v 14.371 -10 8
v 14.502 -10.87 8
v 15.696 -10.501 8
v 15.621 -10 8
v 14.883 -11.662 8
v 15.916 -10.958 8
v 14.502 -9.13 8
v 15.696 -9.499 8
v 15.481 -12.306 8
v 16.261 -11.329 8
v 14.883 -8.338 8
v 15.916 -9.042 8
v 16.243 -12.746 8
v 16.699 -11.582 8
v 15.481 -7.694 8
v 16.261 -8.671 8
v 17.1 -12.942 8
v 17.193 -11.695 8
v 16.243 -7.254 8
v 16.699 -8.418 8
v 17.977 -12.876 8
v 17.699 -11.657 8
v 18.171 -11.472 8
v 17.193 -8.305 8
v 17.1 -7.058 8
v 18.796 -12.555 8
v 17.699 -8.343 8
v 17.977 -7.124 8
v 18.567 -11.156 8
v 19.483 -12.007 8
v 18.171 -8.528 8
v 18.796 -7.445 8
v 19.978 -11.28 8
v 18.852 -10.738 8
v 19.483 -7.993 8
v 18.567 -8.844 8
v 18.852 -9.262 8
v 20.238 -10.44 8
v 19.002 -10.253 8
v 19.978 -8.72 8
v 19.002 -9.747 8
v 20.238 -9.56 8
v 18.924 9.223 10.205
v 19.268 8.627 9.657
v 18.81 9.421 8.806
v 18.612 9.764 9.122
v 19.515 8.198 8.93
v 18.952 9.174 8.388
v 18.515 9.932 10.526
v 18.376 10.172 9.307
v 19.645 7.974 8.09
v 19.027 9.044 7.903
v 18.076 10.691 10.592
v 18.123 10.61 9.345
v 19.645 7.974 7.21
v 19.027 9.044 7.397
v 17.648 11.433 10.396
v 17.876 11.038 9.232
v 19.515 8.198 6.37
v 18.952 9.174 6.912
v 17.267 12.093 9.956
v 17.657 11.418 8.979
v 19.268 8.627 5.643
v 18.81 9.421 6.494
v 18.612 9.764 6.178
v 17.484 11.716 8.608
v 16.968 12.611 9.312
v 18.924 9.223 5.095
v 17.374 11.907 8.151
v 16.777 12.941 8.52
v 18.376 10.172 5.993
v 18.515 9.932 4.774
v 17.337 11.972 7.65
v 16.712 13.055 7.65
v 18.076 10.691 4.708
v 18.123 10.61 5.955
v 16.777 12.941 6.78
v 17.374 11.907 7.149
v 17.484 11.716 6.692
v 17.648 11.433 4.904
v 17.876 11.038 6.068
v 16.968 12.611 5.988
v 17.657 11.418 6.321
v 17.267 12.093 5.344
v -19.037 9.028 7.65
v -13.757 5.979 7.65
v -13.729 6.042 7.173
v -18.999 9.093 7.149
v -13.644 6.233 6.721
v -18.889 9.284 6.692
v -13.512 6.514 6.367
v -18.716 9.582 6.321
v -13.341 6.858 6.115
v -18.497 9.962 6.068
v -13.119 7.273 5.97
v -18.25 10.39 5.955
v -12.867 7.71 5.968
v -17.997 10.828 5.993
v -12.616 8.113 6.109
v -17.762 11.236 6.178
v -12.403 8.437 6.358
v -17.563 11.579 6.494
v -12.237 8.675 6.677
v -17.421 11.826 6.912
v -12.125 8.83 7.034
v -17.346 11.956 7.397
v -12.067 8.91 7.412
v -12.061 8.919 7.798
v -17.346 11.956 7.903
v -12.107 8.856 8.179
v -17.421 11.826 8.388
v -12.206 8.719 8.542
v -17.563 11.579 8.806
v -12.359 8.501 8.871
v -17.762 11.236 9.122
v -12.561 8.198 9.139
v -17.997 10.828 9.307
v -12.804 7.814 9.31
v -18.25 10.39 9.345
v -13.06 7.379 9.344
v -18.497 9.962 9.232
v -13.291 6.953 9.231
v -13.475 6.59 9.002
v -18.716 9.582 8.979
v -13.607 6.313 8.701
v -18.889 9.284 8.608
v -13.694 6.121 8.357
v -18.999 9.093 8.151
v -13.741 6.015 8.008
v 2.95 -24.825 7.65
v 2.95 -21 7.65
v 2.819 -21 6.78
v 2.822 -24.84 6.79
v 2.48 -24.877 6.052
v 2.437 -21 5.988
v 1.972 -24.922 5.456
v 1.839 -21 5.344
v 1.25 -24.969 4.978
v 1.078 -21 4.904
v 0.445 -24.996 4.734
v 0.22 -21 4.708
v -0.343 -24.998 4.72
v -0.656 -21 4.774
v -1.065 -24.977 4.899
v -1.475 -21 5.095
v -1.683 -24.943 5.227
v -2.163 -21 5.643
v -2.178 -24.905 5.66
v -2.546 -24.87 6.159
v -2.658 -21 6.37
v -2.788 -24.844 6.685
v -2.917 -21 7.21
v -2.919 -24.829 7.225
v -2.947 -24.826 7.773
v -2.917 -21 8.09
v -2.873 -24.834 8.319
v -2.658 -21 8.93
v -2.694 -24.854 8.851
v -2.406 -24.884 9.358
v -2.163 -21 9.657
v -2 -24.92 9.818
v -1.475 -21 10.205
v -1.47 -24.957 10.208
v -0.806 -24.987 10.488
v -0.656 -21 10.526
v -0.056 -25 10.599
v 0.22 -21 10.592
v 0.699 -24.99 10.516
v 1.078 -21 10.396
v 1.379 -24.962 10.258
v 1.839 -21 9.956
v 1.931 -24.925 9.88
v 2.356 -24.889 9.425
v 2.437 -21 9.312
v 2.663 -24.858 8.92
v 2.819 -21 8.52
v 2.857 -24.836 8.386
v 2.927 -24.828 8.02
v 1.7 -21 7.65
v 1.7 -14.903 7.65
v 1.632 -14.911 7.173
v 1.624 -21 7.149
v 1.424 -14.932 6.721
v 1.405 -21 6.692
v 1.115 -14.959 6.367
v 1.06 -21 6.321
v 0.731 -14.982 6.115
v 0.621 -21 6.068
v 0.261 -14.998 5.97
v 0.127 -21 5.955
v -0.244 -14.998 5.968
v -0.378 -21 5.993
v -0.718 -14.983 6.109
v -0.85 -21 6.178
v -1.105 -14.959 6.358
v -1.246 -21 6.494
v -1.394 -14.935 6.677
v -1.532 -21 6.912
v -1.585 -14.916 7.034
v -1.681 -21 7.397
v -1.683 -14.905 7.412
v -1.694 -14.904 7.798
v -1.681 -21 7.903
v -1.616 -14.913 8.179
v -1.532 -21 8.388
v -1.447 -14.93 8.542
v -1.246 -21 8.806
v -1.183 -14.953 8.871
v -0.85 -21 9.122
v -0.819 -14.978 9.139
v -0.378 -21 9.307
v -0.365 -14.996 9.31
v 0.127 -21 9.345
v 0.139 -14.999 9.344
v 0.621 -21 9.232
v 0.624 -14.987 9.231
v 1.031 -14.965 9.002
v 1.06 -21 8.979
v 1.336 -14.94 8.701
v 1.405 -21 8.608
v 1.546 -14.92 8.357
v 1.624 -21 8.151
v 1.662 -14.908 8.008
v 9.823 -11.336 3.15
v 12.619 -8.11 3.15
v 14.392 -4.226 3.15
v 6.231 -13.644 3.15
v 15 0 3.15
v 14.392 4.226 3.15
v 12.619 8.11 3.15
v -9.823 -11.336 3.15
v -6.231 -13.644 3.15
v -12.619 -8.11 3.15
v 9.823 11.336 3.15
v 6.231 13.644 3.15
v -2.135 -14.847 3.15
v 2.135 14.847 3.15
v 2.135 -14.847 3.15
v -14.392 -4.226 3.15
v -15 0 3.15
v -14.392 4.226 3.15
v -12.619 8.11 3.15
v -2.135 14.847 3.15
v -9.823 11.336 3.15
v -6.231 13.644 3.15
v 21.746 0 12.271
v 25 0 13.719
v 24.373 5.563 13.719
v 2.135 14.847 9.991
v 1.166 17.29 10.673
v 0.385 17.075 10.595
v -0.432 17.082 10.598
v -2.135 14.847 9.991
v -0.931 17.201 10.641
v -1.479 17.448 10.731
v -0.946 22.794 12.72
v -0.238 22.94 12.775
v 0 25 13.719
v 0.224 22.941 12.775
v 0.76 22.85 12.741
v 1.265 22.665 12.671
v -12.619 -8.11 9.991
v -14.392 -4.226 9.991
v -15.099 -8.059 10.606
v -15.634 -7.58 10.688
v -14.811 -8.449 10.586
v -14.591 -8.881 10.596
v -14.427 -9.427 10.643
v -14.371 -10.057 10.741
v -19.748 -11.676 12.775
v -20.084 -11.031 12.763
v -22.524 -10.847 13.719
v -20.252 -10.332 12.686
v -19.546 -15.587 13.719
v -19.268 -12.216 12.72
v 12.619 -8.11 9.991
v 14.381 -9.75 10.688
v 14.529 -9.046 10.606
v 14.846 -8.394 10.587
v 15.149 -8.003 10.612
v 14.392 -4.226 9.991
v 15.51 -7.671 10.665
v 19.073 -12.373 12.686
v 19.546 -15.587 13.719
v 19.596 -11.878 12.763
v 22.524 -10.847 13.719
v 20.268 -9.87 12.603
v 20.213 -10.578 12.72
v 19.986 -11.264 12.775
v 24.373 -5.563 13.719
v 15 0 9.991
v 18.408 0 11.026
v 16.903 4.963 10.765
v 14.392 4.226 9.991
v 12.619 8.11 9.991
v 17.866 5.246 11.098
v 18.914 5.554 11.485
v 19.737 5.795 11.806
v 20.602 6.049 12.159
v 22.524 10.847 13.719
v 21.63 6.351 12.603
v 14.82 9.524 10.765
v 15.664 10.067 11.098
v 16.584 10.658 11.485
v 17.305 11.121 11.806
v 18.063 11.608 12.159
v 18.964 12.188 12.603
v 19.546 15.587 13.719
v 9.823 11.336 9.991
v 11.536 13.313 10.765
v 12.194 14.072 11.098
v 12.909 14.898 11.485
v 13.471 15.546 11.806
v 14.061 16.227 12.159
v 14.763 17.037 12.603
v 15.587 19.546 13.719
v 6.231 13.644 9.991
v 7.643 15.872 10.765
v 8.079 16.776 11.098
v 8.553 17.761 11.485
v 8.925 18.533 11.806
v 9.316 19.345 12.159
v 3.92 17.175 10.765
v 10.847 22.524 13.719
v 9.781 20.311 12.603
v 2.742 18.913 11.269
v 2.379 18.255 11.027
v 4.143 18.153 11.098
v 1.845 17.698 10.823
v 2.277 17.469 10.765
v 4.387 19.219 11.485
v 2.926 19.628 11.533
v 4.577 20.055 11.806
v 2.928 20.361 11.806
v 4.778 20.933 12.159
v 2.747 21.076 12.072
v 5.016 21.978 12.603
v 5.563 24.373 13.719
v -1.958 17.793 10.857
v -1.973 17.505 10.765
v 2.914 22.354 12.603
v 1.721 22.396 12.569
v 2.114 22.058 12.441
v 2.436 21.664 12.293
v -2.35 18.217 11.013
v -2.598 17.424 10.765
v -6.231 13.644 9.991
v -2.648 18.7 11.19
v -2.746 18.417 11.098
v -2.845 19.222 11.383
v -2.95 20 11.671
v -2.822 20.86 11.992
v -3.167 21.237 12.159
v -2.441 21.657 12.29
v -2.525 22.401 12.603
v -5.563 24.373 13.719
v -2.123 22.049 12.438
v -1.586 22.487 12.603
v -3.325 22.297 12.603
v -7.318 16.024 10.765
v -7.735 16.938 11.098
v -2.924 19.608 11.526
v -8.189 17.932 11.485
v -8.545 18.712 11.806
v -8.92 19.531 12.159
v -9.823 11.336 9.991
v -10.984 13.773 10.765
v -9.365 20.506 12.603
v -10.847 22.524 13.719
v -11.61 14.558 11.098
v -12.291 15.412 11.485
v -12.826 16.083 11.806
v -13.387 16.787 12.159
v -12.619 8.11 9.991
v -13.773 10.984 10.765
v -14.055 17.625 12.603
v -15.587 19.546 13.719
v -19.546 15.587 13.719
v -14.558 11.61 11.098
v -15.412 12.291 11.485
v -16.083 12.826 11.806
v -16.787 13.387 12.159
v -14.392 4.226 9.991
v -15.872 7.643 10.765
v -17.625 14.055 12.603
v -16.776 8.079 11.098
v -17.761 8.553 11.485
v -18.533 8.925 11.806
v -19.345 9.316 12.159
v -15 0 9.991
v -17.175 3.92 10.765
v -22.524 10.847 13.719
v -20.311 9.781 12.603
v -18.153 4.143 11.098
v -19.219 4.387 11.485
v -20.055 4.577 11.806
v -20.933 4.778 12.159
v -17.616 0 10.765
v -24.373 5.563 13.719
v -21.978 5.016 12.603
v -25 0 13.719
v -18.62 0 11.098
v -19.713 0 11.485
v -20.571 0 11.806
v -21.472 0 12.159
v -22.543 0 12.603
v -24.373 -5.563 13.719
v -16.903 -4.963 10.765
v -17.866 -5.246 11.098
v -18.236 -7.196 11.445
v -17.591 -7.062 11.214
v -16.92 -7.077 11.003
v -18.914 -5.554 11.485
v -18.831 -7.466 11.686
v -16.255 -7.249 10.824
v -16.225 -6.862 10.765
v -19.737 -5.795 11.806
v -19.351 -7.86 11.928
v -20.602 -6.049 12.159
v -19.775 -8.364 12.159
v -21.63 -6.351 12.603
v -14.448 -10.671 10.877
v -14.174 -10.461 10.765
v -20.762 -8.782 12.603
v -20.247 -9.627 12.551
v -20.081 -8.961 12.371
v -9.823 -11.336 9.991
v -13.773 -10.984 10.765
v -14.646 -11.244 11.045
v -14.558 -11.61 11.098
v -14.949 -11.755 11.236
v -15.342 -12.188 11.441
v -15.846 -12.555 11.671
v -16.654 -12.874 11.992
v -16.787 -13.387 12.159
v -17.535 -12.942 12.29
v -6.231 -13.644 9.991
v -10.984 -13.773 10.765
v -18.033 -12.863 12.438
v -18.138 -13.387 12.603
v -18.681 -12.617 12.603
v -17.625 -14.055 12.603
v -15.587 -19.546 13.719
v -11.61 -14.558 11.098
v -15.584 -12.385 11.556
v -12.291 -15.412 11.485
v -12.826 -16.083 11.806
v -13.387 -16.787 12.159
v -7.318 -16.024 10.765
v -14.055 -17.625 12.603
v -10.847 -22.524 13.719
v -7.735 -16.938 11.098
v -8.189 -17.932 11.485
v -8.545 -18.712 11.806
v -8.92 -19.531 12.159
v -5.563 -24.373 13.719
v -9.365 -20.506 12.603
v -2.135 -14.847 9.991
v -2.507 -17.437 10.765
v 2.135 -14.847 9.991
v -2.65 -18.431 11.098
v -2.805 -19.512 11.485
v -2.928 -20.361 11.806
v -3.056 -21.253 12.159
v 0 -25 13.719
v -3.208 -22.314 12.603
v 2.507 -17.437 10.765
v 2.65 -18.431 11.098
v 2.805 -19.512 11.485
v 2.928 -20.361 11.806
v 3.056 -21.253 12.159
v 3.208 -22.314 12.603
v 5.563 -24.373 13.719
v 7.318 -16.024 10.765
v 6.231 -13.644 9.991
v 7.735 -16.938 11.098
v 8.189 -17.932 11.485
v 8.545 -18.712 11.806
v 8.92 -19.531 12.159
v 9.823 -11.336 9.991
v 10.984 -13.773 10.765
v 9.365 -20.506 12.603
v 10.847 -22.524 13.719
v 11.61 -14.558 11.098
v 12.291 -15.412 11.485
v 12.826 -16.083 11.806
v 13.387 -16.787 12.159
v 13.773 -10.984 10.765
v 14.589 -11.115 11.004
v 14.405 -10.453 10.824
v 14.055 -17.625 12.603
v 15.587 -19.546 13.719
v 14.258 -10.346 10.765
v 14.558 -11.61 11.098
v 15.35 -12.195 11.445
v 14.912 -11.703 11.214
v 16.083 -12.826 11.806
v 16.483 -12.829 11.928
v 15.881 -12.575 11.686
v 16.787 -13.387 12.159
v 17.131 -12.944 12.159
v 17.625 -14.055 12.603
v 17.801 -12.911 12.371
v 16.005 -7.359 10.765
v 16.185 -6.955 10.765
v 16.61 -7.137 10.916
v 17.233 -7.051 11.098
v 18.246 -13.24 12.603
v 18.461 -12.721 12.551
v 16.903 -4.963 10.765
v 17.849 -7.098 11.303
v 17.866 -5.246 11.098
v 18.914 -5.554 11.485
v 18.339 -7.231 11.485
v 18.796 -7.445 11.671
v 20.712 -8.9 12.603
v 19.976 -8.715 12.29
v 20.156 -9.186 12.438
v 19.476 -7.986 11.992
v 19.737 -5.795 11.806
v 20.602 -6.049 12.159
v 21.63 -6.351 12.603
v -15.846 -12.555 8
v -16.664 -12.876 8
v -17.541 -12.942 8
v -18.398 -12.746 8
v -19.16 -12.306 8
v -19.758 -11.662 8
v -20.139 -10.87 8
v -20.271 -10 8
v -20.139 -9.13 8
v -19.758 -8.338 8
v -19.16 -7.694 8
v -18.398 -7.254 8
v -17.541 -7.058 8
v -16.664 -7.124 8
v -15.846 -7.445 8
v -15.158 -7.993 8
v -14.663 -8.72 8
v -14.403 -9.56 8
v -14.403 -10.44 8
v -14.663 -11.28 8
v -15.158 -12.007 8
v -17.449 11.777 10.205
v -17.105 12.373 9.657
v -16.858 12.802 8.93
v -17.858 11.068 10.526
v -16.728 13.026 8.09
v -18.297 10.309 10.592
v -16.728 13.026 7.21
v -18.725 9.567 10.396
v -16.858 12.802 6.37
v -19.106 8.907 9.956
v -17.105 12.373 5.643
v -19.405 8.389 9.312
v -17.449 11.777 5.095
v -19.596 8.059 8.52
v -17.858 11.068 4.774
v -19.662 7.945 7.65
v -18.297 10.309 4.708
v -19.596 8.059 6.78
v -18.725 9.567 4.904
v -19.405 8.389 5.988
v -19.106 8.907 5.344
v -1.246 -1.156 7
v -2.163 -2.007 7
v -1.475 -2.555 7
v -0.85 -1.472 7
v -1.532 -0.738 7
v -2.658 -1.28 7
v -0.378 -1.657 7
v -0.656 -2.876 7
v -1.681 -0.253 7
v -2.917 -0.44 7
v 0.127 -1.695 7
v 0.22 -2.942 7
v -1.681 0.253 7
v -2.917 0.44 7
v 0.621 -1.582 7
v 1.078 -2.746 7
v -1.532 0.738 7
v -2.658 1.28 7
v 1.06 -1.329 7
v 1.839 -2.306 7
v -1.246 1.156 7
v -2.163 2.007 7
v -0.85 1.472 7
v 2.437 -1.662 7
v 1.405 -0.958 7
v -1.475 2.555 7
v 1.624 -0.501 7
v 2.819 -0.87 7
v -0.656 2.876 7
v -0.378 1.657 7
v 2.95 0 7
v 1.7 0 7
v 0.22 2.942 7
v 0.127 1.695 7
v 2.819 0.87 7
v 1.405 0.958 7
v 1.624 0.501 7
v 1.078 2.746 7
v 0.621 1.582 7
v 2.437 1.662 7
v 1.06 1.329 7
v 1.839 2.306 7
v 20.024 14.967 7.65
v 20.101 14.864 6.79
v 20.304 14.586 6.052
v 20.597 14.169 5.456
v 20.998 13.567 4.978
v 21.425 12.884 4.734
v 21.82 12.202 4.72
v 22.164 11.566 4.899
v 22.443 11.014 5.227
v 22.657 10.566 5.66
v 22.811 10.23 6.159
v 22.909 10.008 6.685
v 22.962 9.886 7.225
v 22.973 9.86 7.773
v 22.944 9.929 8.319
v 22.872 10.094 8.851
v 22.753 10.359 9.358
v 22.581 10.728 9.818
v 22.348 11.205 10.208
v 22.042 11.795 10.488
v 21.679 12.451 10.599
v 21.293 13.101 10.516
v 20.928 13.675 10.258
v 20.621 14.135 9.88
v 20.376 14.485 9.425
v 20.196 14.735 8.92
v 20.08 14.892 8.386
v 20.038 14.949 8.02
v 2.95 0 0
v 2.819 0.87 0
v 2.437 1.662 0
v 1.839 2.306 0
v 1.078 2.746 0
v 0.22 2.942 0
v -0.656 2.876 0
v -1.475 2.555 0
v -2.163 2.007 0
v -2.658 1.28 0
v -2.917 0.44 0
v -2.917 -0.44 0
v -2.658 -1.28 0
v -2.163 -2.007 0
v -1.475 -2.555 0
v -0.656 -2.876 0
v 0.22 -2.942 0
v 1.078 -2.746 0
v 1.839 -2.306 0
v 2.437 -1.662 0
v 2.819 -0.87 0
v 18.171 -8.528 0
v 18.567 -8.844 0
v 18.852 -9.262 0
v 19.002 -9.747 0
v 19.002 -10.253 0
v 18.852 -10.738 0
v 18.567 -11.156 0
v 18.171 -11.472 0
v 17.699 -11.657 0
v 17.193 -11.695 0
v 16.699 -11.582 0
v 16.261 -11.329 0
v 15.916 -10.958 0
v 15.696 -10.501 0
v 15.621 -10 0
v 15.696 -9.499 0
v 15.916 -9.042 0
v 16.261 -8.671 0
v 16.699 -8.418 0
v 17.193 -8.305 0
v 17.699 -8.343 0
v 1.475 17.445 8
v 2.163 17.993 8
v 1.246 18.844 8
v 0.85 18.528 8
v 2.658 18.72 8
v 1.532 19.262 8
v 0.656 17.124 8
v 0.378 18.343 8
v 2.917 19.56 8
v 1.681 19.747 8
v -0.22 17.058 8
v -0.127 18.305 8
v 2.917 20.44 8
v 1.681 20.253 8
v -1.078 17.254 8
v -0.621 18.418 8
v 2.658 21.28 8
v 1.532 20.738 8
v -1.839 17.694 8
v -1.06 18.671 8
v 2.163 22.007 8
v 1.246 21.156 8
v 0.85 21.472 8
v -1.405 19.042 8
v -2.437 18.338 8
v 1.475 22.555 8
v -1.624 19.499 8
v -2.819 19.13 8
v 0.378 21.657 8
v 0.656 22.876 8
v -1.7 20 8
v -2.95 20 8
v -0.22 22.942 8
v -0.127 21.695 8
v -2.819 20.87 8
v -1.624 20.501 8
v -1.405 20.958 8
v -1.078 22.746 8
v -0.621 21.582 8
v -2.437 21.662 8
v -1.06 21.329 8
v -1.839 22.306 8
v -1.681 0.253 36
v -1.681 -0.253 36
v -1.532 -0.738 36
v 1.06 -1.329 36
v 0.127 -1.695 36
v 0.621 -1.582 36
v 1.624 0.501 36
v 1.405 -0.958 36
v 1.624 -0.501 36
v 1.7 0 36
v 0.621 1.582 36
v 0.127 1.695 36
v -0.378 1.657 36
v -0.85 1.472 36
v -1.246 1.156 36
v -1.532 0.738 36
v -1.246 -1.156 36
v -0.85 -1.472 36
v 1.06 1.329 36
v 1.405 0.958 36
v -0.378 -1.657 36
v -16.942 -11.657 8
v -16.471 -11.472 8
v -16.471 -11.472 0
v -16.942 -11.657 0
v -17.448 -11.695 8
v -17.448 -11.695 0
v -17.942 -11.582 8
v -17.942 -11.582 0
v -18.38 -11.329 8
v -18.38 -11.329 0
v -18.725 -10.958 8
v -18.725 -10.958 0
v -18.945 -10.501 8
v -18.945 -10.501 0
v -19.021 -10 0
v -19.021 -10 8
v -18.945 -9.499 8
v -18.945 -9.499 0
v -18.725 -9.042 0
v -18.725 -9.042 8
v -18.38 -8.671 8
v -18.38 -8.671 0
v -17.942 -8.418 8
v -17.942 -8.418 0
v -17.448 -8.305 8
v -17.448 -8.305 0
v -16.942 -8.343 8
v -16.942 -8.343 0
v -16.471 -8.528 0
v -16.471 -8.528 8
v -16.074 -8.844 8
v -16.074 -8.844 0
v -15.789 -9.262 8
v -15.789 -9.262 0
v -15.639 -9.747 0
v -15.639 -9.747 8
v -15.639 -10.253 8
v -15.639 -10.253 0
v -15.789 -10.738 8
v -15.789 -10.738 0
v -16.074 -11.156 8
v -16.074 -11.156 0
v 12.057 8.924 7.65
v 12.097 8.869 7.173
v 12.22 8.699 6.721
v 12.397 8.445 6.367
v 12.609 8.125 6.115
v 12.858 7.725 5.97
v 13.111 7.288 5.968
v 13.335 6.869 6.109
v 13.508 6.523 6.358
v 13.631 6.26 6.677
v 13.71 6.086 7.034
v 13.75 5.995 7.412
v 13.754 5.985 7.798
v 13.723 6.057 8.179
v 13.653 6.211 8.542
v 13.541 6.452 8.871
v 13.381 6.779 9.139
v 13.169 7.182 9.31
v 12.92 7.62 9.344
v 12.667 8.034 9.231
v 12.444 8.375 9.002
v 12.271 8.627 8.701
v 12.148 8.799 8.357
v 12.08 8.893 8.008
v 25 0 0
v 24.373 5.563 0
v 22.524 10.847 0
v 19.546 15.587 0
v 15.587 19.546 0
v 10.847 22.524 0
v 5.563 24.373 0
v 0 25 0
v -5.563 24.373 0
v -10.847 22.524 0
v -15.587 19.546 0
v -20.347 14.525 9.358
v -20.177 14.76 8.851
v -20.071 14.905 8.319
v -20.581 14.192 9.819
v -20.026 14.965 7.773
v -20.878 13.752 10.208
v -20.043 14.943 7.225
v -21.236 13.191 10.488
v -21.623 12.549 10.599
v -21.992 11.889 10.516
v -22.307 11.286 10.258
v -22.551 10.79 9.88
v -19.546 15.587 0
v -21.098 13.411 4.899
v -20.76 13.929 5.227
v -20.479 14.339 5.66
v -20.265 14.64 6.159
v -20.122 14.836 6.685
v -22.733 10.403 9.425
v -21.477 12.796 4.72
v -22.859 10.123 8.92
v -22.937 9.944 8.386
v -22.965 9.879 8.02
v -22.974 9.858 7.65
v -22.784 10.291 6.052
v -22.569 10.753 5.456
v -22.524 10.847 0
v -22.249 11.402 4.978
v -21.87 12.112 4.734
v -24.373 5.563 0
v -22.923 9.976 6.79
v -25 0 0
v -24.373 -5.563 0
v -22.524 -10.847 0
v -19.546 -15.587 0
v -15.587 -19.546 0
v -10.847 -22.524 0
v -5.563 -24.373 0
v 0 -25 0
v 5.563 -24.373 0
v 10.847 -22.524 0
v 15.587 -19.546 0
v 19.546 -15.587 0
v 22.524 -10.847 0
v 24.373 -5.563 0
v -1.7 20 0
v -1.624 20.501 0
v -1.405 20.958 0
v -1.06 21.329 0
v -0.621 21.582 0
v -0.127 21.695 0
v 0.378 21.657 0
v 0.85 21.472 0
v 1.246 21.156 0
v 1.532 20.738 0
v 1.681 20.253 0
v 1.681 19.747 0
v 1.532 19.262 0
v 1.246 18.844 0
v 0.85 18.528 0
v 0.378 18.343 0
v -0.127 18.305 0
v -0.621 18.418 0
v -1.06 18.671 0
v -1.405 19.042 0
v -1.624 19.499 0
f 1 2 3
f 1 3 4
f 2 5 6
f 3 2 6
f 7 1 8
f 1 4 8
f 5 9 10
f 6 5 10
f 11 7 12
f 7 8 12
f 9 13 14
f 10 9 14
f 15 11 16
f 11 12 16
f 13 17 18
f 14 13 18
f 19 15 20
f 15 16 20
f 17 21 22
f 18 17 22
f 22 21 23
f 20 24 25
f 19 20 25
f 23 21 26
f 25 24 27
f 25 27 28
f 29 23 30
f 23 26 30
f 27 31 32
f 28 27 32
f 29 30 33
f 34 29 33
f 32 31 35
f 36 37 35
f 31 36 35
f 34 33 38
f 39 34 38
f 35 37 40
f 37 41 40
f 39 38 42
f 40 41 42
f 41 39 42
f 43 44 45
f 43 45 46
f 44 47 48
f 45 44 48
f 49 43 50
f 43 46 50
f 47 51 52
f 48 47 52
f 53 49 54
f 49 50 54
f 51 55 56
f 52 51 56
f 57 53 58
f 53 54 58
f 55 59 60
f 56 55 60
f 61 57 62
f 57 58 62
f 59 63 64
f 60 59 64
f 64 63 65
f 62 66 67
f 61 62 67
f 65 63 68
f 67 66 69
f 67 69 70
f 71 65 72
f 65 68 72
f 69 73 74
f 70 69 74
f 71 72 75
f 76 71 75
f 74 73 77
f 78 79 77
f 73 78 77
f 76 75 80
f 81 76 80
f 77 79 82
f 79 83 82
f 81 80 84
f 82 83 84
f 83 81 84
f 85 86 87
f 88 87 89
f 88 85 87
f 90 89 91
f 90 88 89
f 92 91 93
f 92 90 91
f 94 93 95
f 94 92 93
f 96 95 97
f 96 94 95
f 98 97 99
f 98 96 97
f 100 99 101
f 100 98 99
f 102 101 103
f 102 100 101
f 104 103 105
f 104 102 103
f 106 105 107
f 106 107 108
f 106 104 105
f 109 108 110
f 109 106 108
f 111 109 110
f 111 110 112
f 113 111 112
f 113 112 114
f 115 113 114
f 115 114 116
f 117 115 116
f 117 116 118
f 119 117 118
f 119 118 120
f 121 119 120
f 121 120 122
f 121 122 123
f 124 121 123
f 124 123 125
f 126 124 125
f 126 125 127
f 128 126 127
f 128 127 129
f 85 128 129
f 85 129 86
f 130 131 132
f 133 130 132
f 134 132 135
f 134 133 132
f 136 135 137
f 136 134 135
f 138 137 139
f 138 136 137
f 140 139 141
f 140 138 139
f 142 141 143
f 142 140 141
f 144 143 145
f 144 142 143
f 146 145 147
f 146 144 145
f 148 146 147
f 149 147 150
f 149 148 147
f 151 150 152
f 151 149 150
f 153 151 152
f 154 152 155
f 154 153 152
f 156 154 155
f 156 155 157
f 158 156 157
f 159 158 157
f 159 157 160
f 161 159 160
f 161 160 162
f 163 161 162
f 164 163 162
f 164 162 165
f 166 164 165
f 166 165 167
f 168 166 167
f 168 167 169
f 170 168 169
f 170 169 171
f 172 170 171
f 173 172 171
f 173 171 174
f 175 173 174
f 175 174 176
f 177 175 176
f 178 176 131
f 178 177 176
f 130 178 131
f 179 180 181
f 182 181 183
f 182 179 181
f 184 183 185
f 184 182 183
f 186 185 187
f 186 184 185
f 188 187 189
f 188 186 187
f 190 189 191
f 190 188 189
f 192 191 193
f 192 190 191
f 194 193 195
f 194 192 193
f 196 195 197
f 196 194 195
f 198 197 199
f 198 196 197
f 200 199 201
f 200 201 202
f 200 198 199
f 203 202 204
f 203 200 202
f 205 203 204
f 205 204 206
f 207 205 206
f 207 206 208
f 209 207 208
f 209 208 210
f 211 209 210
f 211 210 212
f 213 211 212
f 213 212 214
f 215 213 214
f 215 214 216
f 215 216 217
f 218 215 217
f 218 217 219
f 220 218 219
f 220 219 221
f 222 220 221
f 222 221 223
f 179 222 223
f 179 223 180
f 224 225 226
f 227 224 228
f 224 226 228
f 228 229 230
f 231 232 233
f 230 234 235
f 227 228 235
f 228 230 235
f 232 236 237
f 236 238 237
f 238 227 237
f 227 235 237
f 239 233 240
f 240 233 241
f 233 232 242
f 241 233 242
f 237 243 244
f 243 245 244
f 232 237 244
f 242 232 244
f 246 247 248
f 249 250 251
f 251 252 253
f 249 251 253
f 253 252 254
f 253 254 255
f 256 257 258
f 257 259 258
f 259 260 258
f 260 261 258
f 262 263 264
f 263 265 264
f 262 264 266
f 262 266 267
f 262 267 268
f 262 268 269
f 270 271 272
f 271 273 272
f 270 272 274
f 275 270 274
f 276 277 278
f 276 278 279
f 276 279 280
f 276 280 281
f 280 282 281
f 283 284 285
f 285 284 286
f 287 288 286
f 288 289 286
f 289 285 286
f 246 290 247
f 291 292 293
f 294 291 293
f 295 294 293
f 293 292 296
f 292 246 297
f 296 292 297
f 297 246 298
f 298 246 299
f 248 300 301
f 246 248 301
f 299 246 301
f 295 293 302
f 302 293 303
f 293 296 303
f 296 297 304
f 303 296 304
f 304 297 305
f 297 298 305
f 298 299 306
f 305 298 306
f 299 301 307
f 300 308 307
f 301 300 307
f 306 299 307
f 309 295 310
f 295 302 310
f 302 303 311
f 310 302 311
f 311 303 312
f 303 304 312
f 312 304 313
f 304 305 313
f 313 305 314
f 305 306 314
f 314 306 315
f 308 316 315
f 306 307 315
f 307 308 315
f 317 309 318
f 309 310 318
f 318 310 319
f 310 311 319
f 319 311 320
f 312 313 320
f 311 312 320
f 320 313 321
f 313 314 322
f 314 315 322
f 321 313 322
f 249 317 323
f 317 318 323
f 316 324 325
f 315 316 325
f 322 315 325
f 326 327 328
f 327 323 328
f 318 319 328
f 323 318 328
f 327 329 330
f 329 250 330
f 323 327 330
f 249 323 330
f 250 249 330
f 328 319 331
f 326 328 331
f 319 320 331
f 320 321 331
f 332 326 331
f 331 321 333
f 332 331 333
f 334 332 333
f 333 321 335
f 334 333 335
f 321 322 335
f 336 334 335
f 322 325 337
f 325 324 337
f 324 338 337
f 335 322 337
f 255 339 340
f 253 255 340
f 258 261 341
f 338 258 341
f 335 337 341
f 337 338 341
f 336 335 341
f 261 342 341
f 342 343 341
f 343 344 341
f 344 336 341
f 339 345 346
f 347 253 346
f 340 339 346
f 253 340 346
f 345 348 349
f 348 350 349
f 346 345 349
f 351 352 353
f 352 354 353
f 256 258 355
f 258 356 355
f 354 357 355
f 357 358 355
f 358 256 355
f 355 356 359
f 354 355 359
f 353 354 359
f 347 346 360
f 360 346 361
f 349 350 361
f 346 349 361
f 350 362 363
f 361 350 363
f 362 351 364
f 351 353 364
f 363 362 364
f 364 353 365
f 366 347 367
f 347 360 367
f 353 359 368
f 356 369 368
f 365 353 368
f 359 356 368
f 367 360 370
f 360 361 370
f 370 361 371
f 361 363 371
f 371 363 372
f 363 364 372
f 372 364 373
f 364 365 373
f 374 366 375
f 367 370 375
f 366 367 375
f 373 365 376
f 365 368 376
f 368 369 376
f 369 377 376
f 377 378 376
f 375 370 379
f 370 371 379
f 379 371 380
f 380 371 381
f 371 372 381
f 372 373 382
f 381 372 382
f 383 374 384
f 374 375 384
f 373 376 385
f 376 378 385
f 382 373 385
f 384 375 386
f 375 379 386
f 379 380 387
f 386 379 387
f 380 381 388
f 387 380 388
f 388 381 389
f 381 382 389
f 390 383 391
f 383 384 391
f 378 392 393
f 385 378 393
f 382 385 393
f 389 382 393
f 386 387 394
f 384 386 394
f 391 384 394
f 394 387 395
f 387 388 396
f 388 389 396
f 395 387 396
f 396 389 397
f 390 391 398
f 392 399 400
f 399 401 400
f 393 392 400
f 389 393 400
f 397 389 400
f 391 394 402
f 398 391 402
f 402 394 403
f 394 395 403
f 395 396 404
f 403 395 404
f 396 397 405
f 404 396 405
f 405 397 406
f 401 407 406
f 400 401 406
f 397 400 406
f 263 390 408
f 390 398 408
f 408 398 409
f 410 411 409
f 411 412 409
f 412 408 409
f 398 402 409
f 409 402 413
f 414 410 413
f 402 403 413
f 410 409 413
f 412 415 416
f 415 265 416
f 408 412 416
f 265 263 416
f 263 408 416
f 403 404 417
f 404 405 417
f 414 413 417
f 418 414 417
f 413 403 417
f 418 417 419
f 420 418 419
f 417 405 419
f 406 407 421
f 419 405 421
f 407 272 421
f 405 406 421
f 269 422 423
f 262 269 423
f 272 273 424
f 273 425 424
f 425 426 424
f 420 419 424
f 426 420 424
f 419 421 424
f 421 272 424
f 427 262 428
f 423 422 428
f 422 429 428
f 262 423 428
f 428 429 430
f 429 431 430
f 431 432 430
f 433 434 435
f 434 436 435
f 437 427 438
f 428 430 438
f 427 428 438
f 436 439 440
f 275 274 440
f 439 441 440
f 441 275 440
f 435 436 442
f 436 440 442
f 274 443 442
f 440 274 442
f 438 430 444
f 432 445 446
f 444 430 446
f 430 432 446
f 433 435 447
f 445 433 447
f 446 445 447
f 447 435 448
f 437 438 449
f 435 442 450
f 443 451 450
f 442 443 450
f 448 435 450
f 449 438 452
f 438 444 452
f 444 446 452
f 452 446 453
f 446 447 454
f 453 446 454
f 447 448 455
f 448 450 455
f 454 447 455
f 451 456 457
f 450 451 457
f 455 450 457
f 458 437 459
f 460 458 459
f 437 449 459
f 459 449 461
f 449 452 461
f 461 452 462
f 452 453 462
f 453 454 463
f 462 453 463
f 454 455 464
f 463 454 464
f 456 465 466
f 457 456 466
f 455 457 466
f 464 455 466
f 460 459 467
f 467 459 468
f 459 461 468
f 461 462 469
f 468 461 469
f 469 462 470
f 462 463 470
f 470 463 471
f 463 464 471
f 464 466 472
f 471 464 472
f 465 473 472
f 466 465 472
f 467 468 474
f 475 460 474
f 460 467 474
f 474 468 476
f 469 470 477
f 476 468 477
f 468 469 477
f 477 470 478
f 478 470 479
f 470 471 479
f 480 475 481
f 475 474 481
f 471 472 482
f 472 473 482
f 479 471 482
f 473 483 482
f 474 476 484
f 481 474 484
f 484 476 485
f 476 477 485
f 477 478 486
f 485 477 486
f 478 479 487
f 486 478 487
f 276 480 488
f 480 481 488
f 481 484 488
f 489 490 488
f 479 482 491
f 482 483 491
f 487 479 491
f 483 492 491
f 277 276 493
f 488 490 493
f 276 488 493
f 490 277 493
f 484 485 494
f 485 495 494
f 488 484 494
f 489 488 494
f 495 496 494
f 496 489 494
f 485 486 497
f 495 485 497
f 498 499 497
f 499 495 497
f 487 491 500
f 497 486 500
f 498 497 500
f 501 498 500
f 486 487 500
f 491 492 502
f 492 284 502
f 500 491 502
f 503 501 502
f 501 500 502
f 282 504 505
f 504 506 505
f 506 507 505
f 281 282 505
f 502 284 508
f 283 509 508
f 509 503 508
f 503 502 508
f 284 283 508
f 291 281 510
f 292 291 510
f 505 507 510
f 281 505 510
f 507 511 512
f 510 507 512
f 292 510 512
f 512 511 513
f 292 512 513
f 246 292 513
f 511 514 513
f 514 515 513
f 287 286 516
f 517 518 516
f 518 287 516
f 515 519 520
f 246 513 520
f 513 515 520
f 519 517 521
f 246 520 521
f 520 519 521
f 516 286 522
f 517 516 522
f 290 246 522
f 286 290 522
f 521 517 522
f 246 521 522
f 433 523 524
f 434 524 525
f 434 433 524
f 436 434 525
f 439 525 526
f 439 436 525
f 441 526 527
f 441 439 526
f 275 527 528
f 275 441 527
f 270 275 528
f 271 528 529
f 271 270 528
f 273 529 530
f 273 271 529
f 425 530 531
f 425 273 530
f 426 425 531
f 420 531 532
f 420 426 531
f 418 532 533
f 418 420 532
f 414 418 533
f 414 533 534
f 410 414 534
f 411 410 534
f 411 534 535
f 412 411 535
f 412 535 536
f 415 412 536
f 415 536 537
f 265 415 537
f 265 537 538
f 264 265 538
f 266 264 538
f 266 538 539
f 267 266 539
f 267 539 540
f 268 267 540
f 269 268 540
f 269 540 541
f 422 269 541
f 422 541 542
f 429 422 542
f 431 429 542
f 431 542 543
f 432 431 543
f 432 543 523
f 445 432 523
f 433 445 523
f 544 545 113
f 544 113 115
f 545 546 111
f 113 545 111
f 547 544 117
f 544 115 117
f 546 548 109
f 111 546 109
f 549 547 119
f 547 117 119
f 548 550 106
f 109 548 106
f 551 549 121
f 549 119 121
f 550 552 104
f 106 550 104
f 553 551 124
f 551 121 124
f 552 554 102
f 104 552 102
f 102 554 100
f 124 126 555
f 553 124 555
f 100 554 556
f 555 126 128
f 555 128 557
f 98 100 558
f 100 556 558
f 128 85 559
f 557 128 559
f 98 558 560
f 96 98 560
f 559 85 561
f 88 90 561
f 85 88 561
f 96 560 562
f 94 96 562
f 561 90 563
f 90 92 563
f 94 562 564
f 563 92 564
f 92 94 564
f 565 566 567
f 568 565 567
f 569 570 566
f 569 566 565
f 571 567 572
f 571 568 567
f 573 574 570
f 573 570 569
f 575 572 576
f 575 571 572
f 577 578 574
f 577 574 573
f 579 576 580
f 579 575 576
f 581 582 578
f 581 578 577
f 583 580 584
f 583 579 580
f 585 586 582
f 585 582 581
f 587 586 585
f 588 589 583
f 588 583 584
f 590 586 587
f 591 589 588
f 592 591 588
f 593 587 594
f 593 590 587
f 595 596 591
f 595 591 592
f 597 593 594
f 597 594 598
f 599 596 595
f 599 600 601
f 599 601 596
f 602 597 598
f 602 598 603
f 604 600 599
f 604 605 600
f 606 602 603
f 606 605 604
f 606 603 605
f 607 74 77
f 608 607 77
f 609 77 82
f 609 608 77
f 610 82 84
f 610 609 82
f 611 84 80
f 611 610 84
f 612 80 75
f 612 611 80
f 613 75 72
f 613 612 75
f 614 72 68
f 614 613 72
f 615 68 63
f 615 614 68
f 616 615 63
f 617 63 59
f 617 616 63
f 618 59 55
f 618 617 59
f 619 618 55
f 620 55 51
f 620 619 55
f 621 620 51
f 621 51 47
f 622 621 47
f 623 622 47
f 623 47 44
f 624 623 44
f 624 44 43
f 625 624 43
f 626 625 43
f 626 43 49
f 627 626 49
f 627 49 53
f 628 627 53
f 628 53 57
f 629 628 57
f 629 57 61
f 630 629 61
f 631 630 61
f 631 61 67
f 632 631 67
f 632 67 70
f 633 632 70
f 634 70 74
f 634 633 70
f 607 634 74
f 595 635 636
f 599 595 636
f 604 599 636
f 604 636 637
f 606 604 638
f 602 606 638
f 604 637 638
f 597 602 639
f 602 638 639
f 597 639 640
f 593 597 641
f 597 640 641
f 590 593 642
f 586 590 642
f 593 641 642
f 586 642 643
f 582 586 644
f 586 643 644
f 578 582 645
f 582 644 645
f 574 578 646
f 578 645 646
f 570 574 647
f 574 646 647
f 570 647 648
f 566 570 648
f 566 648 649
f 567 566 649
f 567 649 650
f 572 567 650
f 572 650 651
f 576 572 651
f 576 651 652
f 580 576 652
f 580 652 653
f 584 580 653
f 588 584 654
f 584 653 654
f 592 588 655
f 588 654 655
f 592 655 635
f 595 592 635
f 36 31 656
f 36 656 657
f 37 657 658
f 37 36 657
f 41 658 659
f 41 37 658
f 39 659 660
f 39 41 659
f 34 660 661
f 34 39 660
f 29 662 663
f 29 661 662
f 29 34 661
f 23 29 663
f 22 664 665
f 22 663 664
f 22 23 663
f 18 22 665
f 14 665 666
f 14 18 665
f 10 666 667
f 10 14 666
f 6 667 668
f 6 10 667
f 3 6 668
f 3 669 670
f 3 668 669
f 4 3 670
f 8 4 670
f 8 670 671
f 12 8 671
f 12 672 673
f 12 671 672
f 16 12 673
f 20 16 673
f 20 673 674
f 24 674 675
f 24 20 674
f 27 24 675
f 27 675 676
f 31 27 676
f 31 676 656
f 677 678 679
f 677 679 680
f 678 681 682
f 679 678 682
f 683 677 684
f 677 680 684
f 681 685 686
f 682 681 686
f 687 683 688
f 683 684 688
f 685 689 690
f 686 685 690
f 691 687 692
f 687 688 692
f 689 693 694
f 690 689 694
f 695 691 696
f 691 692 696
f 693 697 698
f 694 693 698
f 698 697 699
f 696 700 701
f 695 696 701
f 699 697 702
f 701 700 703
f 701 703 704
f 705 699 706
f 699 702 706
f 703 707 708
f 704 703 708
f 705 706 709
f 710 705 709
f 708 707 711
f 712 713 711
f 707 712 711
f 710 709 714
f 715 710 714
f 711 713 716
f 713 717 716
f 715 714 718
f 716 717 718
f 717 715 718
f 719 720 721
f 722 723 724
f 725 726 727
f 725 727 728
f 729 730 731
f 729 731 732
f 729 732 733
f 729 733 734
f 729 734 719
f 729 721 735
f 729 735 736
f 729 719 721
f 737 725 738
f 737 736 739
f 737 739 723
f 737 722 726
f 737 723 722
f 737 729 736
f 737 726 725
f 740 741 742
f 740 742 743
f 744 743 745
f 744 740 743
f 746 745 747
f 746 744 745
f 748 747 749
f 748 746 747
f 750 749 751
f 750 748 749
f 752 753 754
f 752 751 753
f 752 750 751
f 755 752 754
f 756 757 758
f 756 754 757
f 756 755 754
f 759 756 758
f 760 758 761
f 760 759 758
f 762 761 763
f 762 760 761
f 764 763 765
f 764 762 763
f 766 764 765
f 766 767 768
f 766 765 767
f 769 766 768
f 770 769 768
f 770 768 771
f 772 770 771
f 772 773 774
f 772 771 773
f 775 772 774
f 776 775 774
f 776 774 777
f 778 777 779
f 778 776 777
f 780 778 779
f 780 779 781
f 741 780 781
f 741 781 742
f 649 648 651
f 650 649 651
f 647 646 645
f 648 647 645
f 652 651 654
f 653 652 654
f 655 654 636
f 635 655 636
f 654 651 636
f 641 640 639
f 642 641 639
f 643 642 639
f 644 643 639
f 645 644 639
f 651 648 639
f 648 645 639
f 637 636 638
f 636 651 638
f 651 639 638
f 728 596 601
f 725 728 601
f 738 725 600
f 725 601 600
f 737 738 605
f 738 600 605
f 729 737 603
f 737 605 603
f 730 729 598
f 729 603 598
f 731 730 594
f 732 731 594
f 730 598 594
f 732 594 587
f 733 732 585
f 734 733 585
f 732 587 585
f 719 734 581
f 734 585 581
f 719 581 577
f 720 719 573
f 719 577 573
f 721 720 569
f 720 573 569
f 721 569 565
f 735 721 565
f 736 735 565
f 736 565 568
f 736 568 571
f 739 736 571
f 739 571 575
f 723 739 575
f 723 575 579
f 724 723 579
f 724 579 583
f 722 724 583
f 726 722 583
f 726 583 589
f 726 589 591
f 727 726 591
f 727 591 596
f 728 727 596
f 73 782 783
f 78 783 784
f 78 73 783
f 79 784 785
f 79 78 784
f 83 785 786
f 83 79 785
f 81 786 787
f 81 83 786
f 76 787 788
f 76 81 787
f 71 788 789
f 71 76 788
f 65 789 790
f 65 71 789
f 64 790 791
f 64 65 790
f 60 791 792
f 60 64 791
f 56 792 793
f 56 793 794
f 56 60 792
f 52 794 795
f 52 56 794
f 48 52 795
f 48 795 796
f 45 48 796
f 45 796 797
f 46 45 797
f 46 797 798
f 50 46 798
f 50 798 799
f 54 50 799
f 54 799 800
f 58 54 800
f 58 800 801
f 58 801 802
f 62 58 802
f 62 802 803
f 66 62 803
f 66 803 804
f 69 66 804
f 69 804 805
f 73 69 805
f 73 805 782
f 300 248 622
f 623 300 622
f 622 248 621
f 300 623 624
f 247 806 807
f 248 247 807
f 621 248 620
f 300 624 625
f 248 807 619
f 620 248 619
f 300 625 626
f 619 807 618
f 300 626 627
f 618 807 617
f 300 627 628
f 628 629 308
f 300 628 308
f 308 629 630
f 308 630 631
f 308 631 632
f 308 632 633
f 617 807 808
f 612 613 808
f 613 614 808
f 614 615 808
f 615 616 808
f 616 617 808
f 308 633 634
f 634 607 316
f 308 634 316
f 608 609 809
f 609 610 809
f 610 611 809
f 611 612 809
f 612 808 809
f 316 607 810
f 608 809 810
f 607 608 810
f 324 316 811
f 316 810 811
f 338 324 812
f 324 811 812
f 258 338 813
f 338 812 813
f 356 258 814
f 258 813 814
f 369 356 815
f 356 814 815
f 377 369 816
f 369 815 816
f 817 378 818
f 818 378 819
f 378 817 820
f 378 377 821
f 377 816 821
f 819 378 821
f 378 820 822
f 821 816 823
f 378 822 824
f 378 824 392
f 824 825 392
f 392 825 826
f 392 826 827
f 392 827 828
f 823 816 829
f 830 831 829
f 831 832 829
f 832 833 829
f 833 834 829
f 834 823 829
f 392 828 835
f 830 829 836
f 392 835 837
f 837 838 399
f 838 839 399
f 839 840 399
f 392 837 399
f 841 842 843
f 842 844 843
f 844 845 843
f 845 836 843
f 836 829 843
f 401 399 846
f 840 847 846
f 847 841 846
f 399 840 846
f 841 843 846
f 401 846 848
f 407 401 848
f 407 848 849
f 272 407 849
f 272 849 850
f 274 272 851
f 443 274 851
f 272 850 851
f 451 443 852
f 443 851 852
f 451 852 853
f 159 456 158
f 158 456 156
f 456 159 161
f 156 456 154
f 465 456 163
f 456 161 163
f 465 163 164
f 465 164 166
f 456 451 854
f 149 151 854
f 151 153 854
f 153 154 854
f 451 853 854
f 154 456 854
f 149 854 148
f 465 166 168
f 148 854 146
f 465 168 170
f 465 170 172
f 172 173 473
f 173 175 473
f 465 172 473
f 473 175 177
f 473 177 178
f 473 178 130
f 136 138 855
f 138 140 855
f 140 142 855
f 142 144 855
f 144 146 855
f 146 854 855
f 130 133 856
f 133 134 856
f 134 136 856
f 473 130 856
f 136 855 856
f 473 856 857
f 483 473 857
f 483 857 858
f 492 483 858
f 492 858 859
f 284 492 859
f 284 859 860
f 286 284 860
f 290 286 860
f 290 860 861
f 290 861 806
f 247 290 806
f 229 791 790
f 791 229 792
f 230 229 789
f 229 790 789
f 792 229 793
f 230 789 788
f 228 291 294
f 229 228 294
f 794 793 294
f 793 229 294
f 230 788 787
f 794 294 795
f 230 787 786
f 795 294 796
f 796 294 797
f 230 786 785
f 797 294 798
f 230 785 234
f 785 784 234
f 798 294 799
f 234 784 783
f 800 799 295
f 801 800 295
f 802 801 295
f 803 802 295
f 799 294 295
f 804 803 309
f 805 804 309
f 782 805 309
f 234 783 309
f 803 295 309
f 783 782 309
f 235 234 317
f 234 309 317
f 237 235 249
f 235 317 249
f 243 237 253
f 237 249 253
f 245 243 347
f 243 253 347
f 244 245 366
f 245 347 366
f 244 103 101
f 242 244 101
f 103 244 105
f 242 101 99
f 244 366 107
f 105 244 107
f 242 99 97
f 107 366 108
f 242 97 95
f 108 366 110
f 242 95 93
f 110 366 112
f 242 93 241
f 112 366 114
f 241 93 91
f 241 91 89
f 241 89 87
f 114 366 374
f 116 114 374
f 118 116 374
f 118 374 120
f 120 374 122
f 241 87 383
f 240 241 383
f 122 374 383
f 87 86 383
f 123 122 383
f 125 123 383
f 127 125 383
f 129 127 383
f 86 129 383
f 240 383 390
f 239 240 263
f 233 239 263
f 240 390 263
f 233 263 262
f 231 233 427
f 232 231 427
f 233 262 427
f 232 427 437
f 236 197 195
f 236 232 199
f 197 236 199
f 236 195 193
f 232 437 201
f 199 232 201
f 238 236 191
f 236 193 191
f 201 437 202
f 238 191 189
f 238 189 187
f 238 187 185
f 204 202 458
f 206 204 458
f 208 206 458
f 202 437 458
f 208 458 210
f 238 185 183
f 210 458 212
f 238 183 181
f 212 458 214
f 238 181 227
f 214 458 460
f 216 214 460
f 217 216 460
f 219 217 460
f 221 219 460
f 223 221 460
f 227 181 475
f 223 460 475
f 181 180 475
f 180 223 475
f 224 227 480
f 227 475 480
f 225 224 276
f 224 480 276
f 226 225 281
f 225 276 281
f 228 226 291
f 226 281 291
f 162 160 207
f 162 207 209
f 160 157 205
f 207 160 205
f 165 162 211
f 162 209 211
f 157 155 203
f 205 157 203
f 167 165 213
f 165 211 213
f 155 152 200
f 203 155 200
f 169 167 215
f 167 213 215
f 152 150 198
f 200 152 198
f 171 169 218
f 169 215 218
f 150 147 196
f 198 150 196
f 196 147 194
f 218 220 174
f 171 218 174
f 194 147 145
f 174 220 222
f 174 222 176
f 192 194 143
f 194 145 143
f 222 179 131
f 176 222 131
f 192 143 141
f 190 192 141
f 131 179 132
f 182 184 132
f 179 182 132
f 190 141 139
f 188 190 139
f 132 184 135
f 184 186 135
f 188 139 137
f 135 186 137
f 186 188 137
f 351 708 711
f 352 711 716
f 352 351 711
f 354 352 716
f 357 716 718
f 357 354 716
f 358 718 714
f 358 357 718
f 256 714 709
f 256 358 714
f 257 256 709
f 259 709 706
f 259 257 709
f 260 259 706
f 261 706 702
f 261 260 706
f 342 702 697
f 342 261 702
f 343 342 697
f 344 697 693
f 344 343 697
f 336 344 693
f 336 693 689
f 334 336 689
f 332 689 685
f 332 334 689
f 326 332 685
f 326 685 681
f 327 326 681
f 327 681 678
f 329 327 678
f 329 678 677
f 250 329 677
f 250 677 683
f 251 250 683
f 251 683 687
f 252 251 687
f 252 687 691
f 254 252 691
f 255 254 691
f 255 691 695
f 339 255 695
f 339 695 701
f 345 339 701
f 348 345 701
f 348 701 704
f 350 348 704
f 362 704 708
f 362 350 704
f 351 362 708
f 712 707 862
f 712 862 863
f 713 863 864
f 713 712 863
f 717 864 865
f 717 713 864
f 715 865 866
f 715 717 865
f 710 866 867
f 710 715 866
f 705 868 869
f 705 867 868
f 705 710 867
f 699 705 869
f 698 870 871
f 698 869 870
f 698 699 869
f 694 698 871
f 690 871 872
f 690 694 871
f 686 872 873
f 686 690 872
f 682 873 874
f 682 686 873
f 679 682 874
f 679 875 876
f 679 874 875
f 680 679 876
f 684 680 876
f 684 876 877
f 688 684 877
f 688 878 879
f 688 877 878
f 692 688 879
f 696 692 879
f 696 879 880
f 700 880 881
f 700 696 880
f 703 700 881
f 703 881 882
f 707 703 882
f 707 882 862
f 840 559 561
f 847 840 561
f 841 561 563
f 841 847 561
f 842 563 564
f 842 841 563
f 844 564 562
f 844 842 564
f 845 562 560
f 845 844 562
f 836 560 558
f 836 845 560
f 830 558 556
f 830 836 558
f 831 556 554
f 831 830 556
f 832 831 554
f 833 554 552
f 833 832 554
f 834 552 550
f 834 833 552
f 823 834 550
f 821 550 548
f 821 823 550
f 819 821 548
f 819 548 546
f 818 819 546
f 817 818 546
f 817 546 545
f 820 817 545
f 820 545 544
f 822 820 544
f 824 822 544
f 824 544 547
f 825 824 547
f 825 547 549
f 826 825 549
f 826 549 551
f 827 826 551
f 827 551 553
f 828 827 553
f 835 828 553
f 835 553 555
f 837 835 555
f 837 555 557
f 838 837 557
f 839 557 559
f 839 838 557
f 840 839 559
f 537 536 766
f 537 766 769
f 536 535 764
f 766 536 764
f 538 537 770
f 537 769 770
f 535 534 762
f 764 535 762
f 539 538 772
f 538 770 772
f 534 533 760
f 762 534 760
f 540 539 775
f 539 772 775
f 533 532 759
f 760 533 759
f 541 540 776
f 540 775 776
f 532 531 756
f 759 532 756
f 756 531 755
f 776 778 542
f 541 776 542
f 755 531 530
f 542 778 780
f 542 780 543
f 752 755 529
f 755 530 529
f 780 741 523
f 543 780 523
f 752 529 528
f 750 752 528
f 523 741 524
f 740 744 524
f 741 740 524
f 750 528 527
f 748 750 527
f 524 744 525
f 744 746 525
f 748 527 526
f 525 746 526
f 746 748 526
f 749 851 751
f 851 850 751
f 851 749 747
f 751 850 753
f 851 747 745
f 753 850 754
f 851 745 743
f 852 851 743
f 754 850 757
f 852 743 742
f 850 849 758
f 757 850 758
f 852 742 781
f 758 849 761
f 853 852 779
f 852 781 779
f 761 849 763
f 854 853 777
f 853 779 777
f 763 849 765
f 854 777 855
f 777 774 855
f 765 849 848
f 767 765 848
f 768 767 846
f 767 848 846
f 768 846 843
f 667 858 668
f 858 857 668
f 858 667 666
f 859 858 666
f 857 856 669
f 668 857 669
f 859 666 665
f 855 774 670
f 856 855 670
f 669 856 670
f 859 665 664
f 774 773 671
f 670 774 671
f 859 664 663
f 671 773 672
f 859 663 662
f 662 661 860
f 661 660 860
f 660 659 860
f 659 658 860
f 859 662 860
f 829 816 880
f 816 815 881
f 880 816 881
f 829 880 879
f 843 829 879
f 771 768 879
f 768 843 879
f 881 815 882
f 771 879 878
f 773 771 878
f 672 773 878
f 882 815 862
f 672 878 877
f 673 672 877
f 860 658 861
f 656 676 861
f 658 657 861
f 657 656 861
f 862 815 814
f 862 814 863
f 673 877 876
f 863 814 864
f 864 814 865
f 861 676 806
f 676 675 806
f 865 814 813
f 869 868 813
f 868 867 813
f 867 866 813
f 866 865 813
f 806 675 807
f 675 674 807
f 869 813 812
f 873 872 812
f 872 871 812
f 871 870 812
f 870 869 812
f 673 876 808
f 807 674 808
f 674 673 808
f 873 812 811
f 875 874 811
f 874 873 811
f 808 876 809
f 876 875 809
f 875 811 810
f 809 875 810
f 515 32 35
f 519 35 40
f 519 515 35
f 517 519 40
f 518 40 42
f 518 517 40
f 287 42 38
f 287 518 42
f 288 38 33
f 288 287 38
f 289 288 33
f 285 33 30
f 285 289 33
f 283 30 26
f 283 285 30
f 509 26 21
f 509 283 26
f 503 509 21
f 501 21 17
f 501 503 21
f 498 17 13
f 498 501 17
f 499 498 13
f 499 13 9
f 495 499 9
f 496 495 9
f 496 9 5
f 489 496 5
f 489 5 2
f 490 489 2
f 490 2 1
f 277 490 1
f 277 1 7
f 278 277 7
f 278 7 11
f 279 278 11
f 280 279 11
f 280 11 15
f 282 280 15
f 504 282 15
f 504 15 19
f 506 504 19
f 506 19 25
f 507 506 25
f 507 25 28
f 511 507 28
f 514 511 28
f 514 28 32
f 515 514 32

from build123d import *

# Parameters (mm, degrees)
CYLINDER_R               = 2.95
CYLINDER_DEPTH           = 7
CYLINDER001_R            = 1.7
CYLINDER001_DEPTH        = 30
CLONE308_ROLL_ANGLE      = -90
ARRAY013_COUNT           = 3
CLONE307_PLACEMENT_ANGLE = 180
ARRAY012_COUNT           = 3


with BuildPart() as m3bolthead:
    # Cylinder → Cylinder (new body)
    with BuildSketch(Plane.XY):
        Circle(CYLINDER_R)
    extrude(amount=CYLINDER_DEPTH)


with BuildPart() as m3bolt:
    # Cylinder001 → Cylinder001 (new body)
    with BuildSketch(Plane.XY.offset(6)):
        Circle(CYLINDER001_R)
    extrude(amount=CYLINDER001_DEPTH)

    # Fusion: union M3BoltHead
    add(m3bolthead.part)


with BuildPart() as array013:
    # Clone308 base: copy of M3Bolt
    add(m3bolt.part)


with BuildPart() as array013_1:
    # Clone308 roll: moved
    add(array013.part.rotate(Axis((0, 0, 0), (1, 0, 0)), CLONE308_ROLL_ANGLE))


with BuildPart() as array013_2:
    # Clone308 placement: moved
    add(array013_1.part.moved(Location((0, -28, 7.65))))

    # Array013: Array013 ×3 about axis
    array013_axis = Axis((0, 0, 0), (0, 0, 1))


with BuildPart() as array013_3:
    add(array013_2.part)
    for i in range(1, ARRAY013_COUNT):
        add(array013_2.part.rotate(array013_axis, i * 360 / ARRAY013_COUNT))


with BuildPart() as fusion110:
    # Clone307 base: copy of M3Bolt
    add(m3bolt.part)


with BuildPart() as fusion110_1:
    # Clone307 placement: moved
    add(fusion110.part.moved(Location((0, 20, 15))).rotate(Axis((0, 20, 15), (0, 1, 0)), CLONE307_PLACEMENT_ANGLE))

    # Array012: Fusion110 ×3 about axis
    array012_axis = Axis((0, 0, 0), (0, 0, 1))


with BuildPart() as fusion110_2:
    add(fusion110_1.part)
    for i in range(1, ARRAY012_COUNT):
        add(fusion110_1.part.rotate(array012_axis, i * 360 / ARRAY012_COUNT))

    # Fusion110: union Array013
    add(array013_3.part)


with BuildPart() as art56interface:
    # Sketch060 → Revolution013 (revolve)
    with BuildSketch(Plane.XZ):
        with BuildLine():
            Line((25, 13.719212), (25, 0))
            Line((25, 0), (0, 0))
            Line((0, 0), (0, 3.15))
            Line((0, 3.15), (15, 3.15))
            Line((15, 3.15), (15, 9.990992))
            ThreePointArc((15, 9.990992), (20.086685, 11.622592), (25, 13.719212))
        make_face()
    revolve(axis=Axis((0, 0, 0), (0, 0, 1)))

    # Cut091: cut Fusion110
    add(fusion110_2.part, mode=Mode.SUBTRACT)


solid = Compound([m3bolt.part, art56interface.part])
